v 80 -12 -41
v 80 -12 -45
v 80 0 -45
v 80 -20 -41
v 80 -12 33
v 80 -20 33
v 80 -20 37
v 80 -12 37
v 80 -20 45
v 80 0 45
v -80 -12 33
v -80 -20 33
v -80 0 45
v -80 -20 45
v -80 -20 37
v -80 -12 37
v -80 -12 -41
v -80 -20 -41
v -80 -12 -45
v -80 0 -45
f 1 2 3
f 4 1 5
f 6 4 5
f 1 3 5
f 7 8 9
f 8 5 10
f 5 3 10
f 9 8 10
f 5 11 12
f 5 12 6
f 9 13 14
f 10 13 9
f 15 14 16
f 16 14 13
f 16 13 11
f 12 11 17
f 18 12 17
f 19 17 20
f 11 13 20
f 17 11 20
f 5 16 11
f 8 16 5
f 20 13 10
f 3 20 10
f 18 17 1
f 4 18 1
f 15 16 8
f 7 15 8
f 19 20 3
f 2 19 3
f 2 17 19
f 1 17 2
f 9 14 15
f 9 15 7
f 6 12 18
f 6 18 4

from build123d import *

# Parameters (mm, degrees)
F0_W     = 160
F0_H     = 8
F0_H_2   = 4
F0_H_3   = 74
F1_DEPTH = 12
F2_DEPTH = 20


with BuildPart() as f1:
    # F0 (on Front) → F1 (new body)
    with BuildSketch(Plane.XZ):
        with Locations((0, 41)):
            Rectangle(F0_W, F0_H)
        with Locations((0, 35)):
            Rectangle(F0_W, F0_H_2)
        with Locations((0, -4)):
            Rectangle(F0_W, F0_H_3)
        with Locations((0, -43)):
            Rectangle(F0_W, F0_H_2)
    extrude(amount=F1_DEPTH)

    # F0 (on Front) → F2 (join)
    with BuildSketch(Plane.XZ):
        with Locations((0, 41)):
            Rectangle(F0_W, F0_H)
        with Locations((0, -4)):
            Rectangle(F0_W, F0_H_3)
    extrude(amount=F2_DEPTH)


solid = f1.part
